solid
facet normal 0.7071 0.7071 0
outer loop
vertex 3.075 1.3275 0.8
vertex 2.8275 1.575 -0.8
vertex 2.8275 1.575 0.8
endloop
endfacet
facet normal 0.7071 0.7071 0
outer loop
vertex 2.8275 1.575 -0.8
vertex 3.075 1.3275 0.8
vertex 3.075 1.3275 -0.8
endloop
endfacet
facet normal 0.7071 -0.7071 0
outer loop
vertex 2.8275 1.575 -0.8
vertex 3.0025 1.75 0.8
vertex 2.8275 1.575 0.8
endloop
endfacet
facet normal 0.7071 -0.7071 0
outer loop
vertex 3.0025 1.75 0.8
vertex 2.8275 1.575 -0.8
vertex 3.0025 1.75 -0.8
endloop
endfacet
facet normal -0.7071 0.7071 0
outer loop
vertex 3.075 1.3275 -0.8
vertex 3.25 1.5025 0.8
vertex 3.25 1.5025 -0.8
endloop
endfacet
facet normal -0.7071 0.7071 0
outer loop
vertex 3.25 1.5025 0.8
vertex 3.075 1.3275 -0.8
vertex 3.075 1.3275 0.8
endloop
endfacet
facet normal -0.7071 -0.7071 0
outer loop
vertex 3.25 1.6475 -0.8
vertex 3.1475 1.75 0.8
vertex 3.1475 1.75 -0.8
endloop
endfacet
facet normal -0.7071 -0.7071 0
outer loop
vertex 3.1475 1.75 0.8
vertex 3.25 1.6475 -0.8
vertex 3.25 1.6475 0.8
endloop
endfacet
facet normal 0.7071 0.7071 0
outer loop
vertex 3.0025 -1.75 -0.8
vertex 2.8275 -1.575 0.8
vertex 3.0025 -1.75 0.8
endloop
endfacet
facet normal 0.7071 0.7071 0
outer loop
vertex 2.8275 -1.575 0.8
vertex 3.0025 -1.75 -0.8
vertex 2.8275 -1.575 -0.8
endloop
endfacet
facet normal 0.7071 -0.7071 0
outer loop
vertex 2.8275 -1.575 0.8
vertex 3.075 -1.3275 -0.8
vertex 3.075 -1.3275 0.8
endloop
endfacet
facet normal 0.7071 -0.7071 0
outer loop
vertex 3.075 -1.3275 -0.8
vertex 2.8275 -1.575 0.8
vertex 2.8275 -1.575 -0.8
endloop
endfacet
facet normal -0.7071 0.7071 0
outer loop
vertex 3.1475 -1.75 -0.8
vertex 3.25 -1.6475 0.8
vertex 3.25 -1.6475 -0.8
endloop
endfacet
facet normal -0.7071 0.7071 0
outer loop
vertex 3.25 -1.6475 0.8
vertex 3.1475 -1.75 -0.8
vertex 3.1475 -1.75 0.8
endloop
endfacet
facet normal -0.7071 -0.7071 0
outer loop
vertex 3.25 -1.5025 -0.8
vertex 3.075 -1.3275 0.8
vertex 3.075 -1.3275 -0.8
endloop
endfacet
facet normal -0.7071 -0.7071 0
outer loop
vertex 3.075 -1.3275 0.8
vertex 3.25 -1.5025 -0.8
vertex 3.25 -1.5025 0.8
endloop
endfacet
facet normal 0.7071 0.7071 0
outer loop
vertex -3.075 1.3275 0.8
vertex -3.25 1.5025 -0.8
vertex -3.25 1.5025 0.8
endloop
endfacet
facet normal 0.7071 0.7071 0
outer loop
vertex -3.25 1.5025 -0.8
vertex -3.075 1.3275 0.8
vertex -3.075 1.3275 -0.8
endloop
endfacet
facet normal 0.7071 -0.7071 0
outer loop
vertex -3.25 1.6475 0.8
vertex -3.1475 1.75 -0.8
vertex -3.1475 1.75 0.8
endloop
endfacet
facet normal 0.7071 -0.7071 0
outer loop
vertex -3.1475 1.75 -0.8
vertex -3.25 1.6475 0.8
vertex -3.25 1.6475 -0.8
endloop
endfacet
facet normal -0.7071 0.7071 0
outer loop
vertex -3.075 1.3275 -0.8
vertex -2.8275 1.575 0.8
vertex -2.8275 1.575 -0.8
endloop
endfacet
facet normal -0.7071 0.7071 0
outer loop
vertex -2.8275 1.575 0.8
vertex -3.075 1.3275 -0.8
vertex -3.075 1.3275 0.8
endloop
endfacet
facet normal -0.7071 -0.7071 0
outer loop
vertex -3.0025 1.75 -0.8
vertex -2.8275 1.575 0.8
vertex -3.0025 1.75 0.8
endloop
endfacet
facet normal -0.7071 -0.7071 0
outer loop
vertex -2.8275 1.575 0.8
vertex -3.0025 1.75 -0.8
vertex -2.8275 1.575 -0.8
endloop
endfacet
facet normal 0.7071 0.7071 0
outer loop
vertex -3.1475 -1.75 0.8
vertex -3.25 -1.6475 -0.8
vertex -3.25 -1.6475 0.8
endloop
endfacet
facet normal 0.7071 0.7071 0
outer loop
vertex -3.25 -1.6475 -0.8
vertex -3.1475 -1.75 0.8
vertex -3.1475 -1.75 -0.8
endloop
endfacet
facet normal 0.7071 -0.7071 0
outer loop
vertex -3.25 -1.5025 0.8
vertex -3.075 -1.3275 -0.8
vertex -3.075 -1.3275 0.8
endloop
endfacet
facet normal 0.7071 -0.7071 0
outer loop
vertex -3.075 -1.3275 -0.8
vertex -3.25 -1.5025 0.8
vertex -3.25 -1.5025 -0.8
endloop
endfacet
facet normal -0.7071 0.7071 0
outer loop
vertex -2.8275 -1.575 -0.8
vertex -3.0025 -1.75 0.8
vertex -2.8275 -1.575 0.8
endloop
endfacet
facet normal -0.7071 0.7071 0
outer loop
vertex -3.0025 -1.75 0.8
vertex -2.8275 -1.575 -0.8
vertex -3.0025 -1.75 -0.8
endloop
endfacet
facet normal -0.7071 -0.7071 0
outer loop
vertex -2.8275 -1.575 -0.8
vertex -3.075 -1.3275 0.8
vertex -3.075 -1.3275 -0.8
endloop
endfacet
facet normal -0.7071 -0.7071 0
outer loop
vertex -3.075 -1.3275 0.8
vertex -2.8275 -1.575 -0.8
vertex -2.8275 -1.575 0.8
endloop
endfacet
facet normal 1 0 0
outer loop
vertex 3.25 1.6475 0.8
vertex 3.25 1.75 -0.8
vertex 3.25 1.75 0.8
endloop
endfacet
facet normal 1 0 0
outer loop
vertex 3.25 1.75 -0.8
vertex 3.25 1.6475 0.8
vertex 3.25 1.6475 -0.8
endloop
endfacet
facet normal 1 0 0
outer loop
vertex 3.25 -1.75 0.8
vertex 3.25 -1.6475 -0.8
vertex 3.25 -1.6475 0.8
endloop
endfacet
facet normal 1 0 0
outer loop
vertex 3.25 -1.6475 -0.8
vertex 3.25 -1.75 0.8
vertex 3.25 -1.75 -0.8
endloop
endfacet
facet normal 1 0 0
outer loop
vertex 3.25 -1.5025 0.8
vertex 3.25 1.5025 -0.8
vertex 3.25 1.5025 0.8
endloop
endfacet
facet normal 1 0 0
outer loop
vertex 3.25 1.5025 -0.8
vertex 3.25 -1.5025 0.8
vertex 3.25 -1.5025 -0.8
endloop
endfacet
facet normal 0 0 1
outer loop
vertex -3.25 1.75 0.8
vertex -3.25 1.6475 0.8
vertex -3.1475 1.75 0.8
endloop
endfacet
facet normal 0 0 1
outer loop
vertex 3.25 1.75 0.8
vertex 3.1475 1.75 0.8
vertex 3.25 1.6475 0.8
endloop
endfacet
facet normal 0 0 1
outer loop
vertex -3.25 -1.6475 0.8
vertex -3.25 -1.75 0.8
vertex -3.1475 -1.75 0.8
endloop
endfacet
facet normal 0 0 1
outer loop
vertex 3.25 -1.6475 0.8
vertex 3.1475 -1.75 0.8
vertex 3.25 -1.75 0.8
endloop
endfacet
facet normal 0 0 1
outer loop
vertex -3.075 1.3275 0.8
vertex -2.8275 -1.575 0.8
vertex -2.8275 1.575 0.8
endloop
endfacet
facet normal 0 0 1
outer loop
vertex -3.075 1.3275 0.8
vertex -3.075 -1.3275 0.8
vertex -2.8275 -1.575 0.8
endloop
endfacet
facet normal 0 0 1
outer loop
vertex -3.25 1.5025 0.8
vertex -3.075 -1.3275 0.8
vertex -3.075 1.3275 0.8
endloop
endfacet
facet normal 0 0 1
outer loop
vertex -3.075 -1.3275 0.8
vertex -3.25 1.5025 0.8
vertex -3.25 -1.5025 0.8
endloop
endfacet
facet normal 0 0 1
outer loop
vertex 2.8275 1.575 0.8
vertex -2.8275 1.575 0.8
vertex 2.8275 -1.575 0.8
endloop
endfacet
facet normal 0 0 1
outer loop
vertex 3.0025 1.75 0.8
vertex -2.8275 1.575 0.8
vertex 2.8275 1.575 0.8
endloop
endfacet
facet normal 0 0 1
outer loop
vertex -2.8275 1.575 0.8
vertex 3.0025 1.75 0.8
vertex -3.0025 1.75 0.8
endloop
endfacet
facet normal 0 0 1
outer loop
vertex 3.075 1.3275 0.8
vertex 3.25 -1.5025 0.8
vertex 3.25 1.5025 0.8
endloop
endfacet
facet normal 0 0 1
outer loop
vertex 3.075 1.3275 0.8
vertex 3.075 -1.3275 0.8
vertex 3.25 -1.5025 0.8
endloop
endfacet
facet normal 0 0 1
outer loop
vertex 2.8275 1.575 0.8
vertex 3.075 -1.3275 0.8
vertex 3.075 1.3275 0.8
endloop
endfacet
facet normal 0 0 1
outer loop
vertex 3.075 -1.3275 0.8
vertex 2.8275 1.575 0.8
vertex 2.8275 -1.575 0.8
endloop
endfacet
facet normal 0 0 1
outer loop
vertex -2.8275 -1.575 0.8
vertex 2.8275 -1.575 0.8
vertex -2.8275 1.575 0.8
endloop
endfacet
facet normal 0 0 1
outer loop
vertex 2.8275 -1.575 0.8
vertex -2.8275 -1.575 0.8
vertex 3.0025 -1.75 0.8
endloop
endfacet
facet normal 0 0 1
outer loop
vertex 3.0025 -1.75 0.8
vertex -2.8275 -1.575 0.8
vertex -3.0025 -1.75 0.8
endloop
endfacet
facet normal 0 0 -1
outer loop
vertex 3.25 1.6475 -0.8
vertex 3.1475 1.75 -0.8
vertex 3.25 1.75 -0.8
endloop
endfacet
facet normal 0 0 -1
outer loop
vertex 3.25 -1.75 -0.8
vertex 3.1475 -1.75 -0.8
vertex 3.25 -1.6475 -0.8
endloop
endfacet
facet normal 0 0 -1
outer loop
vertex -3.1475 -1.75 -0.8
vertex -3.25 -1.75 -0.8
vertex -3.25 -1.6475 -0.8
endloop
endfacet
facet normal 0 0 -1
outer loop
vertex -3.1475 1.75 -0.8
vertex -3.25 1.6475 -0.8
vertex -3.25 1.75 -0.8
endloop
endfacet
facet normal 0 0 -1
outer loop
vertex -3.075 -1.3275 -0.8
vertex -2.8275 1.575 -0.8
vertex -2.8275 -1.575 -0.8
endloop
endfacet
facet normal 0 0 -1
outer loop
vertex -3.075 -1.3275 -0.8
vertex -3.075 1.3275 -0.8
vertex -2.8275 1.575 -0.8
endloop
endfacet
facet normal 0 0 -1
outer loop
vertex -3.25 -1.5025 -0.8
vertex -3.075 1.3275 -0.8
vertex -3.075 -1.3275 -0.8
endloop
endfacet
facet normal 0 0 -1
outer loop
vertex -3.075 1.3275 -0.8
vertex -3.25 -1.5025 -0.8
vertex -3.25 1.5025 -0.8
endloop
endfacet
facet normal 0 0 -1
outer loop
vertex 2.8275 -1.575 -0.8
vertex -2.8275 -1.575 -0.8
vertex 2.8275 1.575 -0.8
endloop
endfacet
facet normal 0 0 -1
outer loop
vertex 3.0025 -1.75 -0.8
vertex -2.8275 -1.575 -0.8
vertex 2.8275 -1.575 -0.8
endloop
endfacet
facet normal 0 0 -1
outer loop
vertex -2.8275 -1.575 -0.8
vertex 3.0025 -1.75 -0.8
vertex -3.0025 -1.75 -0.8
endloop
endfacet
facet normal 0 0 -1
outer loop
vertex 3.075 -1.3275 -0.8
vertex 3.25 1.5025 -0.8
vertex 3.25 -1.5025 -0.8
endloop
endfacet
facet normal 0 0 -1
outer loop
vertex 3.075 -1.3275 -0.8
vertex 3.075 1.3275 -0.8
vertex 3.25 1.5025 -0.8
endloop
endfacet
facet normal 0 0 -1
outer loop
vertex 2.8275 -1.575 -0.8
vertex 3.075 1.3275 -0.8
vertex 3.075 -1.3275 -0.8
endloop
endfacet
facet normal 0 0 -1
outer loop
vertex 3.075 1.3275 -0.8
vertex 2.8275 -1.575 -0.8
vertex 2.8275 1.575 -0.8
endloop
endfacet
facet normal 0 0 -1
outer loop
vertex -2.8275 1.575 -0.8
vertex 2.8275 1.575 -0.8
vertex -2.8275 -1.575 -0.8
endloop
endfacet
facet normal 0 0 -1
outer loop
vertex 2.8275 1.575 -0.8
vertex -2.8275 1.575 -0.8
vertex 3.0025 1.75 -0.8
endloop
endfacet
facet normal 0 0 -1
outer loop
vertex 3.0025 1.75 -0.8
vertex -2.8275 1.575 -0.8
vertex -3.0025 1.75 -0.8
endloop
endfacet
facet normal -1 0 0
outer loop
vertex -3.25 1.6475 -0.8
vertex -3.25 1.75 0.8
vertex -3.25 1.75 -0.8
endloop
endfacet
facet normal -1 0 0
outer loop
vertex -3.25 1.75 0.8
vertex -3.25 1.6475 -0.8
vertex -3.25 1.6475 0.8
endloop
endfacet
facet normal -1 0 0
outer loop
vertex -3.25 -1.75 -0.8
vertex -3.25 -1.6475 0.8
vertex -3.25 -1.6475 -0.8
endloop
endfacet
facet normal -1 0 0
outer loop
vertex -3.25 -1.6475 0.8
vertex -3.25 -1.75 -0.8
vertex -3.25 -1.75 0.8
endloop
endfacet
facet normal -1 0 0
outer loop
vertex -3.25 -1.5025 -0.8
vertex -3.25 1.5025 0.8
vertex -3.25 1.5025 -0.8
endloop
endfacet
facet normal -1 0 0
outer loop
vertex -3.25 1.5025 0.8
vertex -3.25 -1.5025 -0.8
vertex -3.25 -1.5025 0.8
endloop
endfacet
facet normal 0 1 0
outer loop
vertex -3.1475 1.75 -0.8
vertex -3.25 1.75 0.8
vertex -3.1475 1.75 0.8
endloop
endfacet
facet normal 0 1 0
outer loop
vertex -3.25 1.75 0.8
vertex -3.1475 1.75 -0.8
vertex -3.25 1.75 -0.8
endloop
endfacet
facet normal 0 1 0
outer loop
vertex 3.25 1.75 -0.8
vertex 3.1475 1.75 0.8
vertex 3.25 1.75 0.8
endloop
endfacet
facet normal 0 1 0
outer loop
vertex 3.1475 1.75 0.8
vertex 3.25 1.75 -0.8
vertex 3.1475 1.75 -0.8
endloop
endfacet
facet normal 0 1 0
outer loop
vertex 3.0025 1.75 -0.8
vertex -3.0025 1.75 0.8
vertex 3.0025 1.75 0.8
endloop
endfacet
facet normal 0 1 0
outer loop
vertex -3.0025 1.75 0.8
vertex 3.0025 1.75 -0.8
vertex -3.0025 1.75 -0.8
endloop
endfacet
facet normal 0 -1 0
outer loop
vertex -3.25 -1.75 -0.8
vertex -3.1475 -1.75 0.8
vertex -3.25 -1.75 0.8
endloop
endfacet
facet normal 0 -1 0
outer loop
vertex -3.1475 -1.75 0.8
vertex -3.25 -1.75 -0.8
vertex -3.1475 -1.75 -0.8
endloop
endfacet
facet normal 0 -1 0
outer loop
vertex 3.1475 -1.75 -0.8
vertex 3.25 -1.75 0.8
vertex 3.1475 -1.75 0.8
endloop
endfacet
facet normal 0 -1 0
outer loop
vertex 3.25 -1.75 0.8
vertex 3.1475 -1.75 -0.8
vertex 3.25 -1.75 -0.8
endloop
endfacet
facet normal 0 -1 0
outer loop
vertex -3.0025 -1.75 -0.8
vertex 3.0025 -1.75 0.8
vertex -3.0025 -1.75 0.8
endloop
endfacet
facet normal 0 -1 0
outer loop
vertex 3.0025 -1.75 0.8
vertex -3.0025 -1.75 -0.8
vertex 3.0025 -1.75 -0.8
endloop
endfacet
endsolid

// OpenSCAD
// Parameters
body_length = 6.5; //[3.25:13:0.1]
body_width = 3.5; //[1.75:7:0.1]
body_height = 1.6; //[0.8:3.2:0.05]
chamfer_size = 0.35; //[0.15:0.8:0.05]
pad_length = 0.9; //[0.4:1.8:0.05]
pad_thickness = 0.12; //[0.05:0.3:0.01]
pad_width_margin = 0.3; //[0.1:0.8:0.05]
pad_overlap = 0.8; //[0.5:1.5:0.05]
mark_radius = 0.35; //[0.15:0.8:0.05]
mark_height = 0.15; //[0.05:0.4:0.01]
mark_inset = 0.6; //[0.2:1.5:0.05]
top_marking_depth = 0.08; //[0.03:0.2:0.01]
top_marking_margin = 0.7; //[0.3:1.5:0.05]
eps = 0.8; //[0.2:2:0.1]

// Base shapes
module smd_body() {
  color([0.85, 0.85, 0.8])
  cube([body_length, body_width, body_height], center=true);
}

module edge_chamfer_wedge(x_pos, y_pos) {
  translate([x_pos, y_pos, 0])
  rotate([0, 0, 45])
  cube([chamfer_size, chamfer_size, body_height + 2*eps], center=true);
}

module terminal_pad(x_pos) {
  translate([x_pos, 0, -(body_height/2 + pad_thickness/2 - eps)])
  cube([pad_length, body_width - 2*pad_width_margin, pad_thickness], center=true);
}

module polarity_mark() {
  translate([-(body_length/2 - mark_inset), body_width/2 - mark_inset, body_height/2 + mark_height/2 - eps])
  cylinder(r=mark_radius, h=mark_height, center=true);
}

module top_marking() {
  translate([0, 0, body_height/2 - top_marking_depth/2 + eps])
  cube([body_length - 2*top_marking_margin, body_width - 2*top_marking_margin, top_marking_depth], center=true);
}

// Operations
module edge_chamfers() {
  union() {
    edge_chamfer_wedge(body_length/2 - chamfer_size/2, body_width/2 - chamfer_size/2);
    edge_chamfer_wedge(body_length/2 - chamfer_size/2, -(body_width/2 - chamfer_size/2));
    edge_chamfer_wedge(-(body_length/2 - chamfer_size/2), body_width/2 - chamfer_size/2);
    edge_chamfer_wedge(-(body_length/2 - chamfer_size/2), -(body_width/2 - chamfer_size/2));
  }
}

module body_with_edge_chamfers() {
  difference() {
    smd_body();
    edge_chamfers();
  }
}

module body_with_edge_chamfers_and_top_marking() {
  difference() {
    body_with_edge_chamfers();
    top_marking();
  }
}

module terminal_pads() {
  union() {
    terminal_pad(-(body_length/2 - pad_overlap - pad_length/2));
    terminal_pad(body_length/2 - pad_overlap - pad_length/2);
  }
}

// Final model
module smd_complete_model() {
  union() {
    body_with_edge_chamfers_and_top_marking();
    terminal_pads();
    polarity_mark();
  }
}

// Render the final model
smd_complete_model();
